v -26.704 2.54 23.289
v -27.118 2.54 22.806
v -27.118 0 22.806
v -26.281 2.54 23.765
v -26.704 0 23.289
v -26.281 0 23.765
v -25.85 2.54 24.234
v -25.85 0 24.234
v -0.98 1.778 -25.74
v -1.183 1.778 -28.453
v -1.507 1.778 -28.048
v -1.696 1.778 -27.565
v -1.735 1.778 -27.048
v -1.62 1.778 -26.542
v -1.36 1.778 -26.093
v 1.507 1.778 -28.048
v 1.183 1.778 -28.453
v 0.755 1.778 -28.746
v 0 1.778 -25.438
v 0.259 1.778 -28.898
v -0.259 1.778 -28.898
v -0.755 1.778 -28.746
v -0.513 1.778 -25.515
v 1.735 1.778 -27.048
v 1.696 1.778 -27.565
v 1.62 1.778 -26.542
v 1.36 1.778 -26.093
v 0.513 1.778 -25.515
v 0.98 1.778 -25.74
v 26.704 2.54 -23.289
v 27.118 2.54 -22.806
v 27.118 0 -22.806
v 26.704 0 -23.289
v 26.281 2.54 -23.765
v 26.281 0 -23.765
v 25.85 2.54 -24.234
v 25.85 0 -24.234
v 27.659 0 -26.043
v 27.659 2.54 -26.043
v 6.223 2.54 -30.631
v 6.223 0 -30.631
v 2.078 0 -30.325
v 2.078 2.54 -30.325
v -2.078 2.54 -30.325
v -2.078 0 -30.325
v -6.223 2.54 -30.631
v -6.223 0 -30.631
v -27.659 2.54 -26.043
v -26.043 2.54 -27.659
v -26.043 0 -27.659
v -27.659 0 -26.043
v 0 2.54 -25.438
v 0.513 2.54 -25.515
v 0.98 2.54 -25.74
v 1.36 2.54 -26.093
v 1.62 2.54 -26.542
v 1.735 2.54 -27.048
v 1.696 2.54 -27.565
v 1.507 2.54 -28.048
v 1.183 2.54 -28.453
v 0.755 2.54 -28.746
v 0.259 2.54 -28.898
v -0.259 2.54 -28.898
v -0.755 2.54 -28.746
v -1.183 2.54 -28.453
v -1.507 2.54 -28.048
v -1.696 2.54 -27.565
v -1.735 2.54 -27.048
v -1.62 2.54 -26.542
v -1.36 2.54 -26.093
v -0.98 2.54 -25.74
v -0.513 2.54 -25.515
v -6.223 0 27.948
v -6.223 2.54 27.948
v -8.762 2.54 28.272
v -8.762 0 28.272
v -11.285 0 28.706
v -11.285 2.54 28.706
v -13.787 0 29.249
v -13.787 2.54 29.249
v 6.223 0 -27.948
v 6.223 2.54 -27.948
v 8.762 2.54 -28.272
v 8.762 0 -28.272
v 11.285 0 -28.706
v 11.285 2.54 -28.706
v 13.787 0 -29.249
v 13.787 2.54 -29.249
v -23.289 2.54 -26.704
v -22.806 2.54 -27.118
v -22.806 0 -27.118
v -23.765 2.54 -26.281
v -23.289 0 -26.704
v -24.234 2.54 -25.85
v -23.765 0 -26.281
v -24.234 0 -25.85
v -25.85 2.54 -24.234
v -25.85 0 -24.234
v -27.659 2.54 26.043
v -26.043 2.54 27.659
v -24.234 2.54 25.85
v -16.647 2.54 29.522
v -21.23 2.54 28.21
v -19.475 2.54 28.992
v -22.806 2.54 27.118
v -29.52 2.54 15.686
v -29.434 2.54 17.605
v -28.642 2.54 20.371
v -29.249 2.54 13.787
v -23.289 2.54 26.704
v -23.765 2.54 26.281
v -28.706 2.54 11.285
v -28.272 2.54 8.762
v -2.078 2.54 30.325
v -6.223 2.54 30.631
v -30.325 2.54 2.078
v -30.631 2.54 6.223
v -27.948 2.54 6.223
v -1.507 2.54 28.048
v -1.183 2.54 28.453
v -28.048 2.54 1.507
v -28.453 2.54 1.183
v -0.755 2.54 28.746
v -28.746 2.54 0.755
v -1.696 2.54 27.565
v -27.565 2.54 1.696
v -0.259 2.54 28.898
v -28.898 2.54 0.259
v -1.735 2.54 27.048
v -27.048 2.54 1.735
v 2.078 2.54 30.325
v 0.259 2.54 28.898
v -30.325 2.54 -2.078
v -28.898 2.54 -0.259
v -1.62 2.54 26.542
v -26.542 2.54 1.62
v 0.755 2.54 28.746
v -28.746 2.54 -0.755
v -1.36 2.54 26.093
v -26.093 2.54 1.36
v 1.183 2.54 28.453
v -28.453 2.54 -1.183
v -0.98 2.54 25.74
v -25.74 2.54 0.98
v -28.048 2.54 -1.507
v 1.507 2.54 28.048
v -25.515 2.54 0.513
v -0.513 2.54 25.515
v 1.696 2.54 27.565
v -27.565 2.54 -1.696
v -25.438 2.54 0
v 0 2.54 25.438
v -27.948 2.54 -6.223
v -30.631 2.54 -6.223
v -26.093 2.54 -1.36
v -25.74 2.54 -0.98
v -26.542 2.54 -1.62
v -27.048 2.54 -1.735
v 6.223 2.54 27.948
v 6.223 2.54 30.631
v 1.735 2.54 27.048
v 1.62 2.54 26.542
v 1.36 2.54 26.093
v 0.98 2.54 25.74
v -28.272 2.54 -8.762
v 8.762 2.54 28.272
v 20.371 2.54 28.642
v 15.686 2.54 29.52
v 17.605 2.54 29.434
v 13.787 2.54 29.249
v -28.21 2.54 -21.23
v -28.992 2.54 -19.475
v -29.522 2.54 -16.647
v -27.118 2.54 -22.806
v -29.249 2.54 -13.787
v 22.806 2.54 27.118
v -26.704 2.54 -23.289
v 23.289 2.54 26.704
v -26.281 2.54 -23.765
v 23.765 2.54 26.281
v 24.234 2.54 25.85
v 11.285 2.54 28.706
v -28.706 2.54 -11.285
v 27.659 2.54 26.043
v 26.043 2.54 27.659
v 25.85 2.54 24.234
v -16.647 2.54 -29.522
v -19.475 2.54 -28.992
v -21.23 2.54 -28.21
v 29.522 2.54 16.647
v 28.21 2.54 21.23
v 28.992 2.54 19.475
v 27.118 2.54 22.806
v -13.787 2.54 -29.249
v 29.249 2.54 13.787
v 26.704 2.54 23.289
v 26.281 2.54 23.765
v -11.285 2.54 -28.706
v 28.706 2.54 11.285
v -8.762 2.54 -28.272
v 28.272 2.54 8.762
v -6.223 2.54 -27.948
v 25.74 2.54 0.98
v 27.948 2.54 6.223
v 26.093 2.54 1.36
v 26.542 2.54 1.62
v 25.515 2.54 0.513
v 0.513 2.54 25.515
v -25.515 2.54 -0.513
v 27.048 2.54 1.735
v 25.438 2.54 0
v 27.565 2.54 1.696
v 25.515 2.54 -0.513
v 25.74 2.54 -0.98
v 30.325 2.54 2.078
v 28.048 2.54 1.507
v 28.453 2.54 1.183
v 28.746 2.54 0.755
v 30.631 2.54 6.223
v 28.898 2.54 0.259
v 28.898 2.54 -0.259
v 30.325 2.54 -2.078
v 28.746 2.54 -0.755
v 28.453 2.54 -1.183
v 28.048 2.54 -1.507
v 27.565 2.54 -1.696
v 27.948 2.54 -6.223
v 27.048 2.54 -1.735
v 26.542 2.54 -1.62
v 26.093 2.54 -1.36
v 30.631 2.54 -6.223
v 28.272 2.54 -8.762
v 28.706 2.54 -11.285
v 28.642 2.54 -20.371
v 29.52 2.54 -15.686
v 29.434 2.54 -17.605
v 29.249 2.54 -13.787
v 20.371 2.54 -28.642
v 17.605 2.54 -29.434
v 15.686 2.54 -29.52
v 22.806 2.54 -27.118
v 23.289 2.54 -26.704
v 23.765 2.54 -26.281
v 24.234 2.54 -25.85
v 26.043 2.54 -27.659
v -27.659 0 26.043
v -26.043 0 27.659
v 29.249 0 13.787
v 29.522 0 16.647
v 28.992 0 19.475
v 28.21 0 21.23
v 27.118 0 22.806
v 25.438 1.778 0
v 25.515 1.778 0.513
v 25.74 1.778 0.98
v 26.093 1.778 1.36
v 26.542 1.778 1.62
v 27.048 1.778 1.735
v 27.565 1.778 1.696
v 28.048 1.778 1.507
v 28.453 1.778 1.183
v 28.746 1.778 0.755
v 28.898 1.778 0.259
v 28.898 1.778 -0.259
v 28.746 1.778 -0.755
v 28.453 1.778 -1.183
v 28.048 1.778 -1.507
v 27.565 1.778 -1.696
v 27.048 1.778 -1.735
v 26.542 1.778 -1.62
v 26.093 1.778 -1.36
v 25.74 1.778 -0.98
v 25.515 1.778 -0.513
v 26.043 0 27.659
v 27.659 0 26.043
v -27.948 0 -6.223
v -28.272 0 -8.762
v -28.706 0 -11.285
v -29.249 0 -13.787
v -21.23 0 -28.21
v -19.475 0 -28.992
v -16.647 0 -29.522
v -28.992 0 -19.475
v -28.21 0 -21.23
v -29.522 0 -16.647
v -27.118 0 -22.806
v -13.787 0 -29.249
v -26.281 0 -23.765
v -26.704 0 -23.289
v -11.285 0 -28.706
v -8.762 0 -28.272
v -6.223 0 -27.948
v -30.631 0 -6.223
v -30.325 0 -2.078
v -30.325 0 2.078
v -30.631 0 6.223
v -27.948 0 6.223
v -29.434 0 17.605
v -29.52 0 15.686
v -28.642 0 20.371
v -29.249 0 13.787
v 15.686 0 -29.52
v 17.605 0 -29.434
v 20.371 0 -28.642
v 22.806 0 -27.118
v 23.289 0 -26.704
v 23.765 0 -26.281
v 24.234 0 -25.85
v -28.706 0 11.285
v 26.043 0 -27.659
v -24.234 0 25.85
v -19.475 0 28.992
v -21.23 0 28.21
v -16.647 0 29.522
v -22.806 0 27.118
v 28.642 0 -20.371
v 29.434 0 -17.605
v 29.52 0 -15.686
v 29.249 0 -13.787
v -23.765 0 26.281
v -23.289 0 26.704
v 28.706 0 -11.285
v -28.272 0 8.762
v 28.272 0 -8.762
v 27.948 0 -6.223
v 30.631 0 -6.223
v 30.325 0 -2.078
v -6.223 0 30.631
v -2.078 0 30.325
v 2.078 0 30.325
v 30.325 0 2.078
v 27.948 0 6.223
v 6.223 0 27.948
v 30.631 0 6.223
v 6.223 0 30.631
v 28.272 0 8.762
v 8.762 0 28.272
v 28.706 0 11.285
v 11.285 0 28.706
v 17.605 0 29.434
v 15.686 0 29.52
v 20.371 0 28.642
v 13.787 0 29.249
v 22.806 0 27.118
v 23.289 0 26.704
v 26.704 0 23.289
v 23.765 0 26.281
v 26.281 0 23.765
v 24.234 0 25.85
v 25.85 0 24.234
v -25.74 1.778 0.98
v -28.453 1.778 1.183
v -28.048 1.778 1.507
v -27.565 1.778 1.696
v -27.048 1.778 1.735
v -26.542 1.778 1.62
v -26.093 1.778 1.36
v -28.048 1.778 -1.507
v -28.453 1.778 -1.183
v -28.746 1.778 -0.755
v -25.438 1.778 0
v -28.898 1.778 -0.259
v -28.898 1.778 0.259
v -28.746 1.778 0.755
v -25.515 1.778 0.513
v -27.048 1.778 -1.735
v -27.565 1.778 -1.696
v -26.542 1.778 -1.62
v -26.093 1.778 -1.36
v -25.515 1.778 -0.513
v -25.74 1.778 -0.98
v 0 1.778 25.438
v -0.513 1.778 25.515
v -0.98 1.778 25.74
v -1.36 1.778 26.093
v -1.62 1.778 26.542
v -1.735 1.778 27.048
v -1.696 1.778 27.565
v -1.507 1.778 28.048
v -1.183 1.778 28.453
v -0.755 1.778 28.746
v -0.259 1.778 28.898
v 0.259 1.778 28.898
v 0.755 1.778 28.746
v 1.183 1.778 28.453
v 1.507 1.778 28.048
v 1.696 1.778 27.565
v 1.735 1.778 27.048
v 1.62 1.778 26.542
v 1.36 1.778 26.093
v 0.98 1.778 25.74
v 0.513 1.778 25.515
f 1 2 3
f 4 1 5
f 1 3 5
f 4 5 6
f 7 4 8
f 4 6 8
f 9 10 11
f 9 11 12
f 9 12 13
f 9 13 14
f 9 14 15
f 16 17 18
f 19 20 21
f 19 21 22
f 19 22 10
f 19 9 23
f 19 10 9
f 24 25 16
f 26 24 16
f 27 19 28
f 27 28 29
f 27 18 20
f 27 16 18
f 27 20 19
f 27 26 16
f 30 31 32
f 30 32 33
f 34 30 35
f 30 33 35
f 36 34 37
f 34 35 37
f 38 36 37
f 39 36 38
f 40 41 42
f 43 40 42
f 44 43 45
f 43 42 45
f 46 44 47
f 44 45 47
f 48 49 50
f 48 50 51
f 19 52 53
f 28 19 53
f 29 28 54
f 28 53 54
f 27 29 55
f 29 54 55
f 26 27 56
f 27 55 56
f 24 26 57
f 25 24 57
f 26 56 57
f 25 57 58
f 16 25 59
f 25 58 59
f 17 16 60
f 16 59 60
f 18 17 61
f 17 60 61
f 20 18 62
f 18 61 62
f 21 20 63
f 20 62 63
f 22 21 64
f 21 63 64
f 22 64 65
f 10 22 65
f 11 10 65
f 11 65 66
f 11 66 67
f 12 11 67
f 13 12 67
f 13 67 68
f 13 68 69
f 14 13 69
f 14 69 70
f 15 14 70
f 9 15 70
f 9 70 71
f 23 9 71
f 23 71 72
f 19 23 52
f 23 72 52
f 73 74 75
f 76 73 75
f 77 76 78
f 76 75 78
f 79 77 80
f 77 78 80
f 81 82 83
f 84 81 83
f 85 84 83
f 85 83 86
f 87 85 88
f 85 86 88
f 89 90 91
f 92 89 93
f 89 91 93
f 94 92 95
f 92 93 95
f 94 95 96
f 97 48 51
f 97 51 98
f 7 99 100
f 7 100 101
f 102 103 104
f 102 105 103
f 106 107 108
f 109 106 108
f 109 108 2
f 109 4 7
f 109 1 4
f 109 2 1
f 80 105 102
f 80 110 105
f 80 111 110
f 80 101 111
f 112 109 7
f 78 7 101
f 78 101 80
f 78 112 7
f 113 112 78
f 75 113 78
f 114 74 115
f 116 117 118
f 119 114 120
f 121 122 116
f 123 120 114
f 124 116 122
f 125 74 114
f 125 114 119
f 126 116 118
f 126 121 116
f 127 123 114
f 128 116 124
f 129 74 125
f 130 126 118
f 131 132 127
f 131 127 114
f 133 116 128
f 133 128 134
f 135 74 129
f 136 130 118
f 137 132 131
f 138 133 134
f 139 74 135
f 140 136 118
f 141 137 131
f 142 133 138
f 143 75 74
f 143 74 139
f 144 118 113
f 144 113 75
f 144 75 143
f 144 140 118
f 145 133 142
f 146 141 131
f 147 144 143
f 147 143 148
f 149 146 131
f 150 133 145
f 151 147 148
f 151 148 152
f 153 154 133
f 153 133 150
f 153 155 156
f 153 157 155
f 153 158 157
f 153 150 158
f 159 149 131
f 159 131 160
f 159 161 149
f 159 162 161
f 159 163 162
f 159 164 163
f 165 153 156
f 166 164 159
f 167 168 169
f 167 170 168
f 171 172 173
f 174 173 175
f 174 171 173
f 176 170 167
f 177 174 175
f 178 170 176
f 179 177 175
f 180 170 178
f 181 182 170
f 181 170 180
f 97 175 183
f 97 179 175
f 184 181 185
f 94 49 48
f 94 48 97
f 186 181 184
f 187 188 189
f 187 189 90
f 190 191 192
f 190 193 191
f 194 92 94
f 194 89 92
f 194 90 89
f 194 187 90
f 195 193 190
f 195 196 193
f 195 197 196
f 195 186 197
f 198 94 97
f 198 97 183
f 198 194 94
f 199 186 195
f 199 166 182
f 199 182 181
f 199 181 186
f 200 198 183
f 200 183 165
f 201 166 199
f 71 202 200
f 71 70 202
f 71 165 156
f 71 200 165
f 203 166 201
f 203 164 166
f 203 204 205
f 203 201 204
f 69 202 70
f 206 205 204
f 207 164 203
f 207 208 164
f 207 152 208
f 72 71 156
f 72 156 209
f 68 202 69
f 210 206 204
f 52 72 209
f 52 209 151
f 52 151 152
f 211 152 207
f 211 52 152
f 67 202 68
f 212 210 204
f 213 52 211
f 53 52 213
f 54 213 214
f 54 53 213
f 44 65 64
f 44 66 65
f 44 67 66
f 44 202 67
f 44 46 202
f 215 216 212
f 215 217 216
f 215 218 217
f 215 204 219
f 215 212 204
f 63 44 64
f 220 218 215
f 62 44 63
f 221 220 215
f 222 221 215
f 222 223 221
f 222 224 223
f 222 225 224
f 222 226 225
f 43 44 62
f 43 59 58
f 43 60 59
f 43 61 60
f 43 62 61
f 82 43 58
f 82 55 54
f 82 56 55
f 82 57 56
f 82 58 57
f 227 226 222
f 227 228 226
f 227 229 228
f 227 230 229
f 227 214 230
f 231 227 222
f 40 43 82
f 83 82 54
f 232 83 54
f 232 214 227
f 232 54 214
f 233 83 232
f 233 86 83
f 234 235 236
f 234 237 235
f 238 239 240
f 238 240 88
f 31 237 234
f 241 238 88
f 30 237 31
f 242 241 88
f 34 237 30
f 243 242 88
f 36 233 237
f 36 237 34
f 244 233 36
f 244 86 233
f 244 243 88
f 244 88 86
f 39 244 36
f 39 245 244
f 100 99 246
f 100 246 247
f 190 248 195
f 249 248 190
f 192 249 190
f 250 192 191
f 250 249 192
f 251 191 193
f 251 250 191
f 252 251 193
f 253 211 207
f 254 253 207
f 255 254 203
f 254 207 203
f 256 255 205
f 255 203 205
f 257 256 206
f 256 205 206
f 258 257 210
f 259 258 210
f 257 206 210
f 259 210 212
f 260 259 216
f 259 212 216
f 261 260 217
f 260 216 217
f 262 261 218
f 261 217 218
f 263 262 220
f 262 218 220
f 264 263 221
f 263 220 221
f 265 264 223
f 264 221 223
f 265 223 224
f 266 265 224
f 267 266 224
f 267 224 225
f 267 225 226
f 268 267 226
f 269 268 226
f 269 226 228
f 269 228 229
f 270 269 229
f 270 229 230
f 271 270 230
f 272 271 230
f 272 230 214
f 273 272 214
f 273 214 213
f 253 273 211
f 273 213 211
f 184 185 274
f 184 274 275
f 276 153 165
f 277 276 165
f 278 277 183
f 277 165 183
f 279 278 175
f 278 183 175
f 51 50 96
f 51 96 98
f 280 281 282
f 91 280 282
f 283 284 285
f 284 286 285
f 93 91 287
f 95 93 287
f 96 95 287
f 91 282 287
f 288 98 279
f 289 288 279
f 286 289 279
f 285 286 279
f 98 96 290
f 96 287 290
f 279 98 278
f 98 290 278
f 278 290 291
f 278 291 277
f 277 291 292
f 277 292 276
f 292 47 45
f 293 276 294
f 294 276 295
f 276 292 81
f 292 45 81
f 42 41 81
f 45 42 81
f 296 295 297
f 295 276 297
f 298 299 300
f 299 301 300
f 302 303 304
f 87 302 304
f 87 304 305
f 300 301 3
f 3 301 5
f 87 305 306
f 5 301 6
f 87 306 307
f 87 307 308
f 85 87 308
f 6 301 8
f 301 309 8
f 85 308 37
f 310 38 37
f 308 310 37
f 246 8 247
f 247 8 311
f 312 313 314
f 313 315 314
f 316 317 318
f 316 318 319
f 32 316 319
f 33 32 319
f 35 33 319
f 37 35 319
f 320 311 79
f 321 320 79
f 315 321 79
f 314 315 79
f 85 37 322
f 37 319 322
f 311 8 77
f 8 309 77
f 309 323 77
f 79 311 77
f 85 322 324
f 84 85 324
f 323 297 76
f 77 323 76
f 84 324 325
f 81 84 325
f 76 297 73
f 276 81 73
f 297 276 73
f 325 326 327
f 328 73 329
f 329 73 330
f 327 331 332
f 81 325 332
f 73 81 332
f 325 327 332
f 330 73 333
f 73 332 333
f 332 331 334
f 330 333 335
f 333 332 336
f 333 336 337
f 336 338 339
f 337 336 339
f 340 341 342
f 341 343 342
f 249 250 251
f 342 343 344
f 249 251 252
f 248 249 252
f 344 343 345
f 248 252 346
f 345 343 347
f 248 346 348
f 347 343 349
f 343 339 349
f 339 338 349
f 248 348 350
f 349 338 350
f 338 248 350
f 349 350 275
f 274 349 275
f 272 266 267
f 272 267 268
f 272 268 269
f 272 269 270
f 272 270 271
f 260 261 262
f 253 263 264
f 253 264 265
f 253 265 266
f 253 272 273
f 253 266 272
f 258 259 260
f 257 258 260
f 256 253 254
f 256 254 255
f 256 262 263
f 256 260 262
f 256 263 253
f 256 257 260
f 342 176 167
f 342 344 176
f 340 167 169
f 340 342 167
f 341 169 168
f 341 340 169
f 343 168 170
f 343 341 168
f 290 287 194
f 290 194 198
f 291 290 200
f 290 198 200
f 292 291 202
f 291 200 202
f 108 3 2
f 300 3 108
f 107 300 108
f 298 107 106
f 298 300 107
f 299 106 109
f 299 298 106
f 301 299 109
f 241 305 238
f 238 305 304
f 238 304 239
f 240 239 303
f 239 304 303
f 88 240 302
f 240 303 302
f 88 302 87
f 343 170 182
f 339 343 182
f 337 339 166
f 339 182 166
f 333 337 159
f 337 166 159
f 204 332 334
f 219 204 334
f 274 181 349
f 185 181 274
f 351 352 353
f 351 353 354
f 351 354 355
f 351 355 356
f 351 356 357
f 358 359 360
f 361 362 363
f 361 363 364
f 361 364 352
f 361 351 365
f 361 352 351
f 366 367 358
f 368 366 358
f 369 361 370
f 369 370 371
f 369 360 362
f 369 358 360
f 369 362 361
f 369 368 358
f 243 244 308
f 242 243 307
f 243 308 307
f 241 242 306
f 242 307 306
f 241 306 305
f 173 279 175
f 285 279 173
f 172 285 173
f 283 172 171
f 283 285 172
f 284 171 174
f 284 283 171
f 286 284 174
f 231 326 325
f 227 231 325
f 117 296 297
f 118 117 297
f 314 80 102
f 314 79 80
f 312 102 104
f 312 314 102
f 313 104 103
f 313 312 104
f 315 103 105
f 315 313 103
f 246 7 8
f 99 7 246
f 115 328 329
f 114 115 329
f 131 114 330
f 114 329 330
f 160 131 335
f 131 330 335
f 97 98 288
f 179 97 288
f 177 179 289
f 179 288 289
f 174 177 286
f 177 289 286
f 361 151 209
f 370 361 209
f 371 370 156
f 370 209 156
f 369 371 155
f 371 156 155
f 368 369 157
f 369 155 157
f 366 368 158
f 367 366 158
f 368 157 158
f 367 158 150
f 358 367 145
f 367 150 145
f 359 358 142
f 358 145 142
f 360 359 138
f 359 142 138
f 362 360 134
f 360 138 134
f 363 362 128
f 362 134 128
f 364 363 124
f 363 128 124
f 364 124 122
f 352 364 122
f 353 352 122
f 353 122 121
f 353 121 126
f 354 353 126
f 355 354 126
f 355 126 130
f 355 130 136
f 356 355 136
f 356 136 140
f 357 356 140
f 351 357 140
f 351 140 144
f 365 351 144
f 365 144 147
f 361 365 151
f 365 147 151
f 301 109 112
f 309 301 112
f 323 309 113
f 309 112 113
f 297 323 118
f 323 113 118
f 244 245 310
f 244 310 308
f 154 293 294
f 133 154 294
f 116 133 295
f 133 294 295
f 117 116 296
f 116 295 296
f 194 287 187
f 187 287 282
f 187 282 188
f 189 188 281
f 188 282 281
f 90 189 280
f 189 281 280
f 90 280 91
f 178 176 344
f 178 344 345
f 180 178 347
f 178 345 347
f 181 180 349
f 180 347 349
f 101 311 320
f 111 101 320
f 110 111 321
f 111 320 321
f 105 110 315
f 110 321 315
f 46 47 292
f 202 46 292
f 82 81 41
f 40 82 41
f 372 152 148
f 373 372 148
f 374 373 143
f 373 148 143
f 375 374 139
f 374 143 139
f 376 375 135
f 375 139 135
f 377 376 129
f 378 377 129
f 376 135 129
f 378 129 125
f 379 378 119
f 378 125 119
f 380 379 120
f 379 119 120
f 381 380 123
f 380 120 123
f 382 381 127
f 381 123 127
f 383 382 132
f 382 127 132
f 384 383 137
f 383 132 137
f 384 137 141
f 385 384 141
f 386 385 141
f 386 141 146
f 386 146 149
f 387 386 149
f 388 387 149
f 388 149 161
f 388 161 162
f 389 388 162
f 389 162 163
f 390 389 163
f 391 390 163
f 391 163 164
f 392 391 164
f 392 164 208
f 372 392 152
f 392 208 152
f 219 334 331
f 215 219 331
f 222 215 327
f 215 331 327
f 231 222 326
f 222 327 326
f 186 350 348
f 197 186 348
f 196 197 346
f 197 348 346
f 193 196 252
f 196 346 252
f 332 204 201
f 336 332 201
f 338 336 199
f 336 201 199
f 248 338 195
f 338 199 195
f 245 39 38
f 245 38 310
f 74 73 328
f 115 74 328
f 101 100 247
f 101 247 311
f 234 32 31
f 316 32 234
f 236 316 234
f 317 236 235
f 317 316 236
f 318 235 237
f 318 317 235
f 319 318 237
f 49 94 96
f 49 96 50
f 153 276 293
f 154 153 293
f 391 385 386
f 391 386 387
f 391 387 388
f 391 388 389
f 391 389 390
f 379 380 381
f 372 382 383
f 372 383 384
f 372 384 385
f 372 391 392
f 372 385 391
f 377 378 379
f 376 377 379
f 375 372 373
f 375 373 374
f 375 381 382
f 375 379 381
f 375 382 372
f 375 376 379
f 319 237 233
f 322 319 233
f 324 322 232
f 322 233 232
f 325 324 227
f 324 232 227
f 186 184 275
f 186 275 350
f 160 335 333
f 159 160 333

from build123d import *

# Parameters (mm, degrees)
SKETCH1_R                = 35.433
BOSS_EXTRUDE1_DEPTH      = 2.54
SKETCH2_R                = 59.158135963
CUT_EXTRUDE1_DEPTH       = 51.174162454
BOSS_EXTRUDE3_DEPTH      = 2.54
SKETCH4_R                = 1.7399
CUT_EXTRUDE2_DEPTH       = 0.762
FILLET1_R                = 10.287
EXTRUDE_THIN1_DEPTH      = 2.54
CIRPATTERN1_COUNT        = 4
FILLET1_OF_CIRPATTERN1_R = 10.287


with BuildPart() as part:
    # Sketch1 → Boss-Extrude1 (new body)
    with BuildSketch(Plane(origin=(0, 0, 0), x_dir=(1, 0, 0), z_dir=(0, 1, 0))):
        with Locations(Location((0, 0, 0), (0, 0, 270))):
            Circle(SKETCH1_R)
    extrude(amount=BOSS_EXTRUDE1_DEPTH)

    # Sketch2 → Cut-Extrude1 (cut, through all)
    with BuildSketch(Plane(origin=(0, 2.54, 0), x_dir=(1, 0, 0), z_dir=(0, 1, 0))):
        with Locations((0, 86.777928127)):
            Circle(SKETCH2_R)
    cut_extrude1 = extrude(amount=-CUT_EXTRUDE1_DEPTH, mode=Mode.SUBTRACT)

    # Sketch3 → Boss-Extrude3 (add)
    with BuildSketch(Plane(origin=(0, 0, 0), x_dir=(-1, 0, 0), z_dir=(0, -1, 0))):
        with BuildLine():
            Line((6.223, 22.34125112), (-6.223, 22.34125112))
            Line((-6.223, 22.34125112), (-6.223, 30.630597706))
            ThreePointArc((-6.223, 30.630597706), (0, 30.286792164), (6.223, 30.630597706))
            Line((6.223, 30.630597706), (6.223, 22.34125112))
        make_face()
    boss_extrude3 = extrude(amount=-BOSS_EXTRUDE3_DEPTH)

    # Sketch4 → Cut-Extrude2 (cut)
    with BuildSketch(Plane(origin=(0, 2.54, 0), x_dir=(1, 0, 0), z_dir=(0, 1, 0))):
        with Locations(Location((0, 27.178, 0), (0, 0, 270))):
            Circle(SKETCH4_R)
    cut_extrude2 = extrude(amount=-CUT_EXTRUDE2_DEPTH, mode=Mode.SUBTRACT)

    # Fillet1
    fillet1_edges = [part.edges().sort_by_distance(p)[0] for p in [
        (18.104908895, 1.27, -30.458328301),
        (-18.104908895, 1.27, -30.458328301),
    ]]
    fillet(fillet1_edges, radius=FILLET1_R)

    # Sketch5 → Extrude-Thin1 (add)
    with BuildSketch(Plane(origin=(0, 2.54, 0), x_dir=(1, 0, 0), z_dir=(0, 1, 0))):
        Polygon((0.808223051, -0.808223051), (27.659188853, 26.042742751), (26.042742751, 27.659188853), (-0.808223051, 0.808223051), align=None)
    extrude_thin1 = extrude(amount=-EXTRUDE_THIN1_DEPTH)

    # CirPattern1: Cut-Extrude1, Boss-Extrude3, Cut-Extrude2, Extrude-Thin1 ×4 about axis
    cirpattern1_axis = Axis((0, 0, 0), (0, 1, 0))
    add([cut_extrude1.rotate(cirpattern1_axis, i * 360 / CIRPATTERN1_COUNT) for i in range(1, CIRPATTERN1_COUNT)], mode=Mode.SUBTRACT)
    add([boss_extrude3.rotate(cirpattern1_axis, i * 360 / CIRPATTERN1_COUNT) for i in range(1, CIRPATTERN1_COUNT)])
    add([cut_extrude2.rotate(cirpattern1_axis, i * 360 / CIRPATTERN1_COUNT) for i in range(1, CIRPATTERN1_COUNT)], mode=Mode.SUBTRACT)
    add([extrude_thin1.rotate(cirpattern1_axis, i * 360 / CIRPATTERN1_COUNT) for i in range(1, CIRPATTERN1_COUNT)])

    # Fillet1 of CirPattern1
    fillet1_of_cirpattern1_edges = [part.edges().sort_by_distance(p)[0] for p in [
        (-30.458328301, 1.27, -18.104908895),
        (-30.458328301, 1.27, 18.104908895),
        (-18.104908895, 1.27, 30.458328301),
        (18.104908895, 1.27, 30.458328301),
        (30.458328301, 1.27, 18.104908895),
        (30.458328301, 1.27, -18.104908895),
    ]]
    fillet(fillet1_of_cirpattern1_edges, radius=FILLET1_OF_CIRPATTERN1_R)


solid = part.part
